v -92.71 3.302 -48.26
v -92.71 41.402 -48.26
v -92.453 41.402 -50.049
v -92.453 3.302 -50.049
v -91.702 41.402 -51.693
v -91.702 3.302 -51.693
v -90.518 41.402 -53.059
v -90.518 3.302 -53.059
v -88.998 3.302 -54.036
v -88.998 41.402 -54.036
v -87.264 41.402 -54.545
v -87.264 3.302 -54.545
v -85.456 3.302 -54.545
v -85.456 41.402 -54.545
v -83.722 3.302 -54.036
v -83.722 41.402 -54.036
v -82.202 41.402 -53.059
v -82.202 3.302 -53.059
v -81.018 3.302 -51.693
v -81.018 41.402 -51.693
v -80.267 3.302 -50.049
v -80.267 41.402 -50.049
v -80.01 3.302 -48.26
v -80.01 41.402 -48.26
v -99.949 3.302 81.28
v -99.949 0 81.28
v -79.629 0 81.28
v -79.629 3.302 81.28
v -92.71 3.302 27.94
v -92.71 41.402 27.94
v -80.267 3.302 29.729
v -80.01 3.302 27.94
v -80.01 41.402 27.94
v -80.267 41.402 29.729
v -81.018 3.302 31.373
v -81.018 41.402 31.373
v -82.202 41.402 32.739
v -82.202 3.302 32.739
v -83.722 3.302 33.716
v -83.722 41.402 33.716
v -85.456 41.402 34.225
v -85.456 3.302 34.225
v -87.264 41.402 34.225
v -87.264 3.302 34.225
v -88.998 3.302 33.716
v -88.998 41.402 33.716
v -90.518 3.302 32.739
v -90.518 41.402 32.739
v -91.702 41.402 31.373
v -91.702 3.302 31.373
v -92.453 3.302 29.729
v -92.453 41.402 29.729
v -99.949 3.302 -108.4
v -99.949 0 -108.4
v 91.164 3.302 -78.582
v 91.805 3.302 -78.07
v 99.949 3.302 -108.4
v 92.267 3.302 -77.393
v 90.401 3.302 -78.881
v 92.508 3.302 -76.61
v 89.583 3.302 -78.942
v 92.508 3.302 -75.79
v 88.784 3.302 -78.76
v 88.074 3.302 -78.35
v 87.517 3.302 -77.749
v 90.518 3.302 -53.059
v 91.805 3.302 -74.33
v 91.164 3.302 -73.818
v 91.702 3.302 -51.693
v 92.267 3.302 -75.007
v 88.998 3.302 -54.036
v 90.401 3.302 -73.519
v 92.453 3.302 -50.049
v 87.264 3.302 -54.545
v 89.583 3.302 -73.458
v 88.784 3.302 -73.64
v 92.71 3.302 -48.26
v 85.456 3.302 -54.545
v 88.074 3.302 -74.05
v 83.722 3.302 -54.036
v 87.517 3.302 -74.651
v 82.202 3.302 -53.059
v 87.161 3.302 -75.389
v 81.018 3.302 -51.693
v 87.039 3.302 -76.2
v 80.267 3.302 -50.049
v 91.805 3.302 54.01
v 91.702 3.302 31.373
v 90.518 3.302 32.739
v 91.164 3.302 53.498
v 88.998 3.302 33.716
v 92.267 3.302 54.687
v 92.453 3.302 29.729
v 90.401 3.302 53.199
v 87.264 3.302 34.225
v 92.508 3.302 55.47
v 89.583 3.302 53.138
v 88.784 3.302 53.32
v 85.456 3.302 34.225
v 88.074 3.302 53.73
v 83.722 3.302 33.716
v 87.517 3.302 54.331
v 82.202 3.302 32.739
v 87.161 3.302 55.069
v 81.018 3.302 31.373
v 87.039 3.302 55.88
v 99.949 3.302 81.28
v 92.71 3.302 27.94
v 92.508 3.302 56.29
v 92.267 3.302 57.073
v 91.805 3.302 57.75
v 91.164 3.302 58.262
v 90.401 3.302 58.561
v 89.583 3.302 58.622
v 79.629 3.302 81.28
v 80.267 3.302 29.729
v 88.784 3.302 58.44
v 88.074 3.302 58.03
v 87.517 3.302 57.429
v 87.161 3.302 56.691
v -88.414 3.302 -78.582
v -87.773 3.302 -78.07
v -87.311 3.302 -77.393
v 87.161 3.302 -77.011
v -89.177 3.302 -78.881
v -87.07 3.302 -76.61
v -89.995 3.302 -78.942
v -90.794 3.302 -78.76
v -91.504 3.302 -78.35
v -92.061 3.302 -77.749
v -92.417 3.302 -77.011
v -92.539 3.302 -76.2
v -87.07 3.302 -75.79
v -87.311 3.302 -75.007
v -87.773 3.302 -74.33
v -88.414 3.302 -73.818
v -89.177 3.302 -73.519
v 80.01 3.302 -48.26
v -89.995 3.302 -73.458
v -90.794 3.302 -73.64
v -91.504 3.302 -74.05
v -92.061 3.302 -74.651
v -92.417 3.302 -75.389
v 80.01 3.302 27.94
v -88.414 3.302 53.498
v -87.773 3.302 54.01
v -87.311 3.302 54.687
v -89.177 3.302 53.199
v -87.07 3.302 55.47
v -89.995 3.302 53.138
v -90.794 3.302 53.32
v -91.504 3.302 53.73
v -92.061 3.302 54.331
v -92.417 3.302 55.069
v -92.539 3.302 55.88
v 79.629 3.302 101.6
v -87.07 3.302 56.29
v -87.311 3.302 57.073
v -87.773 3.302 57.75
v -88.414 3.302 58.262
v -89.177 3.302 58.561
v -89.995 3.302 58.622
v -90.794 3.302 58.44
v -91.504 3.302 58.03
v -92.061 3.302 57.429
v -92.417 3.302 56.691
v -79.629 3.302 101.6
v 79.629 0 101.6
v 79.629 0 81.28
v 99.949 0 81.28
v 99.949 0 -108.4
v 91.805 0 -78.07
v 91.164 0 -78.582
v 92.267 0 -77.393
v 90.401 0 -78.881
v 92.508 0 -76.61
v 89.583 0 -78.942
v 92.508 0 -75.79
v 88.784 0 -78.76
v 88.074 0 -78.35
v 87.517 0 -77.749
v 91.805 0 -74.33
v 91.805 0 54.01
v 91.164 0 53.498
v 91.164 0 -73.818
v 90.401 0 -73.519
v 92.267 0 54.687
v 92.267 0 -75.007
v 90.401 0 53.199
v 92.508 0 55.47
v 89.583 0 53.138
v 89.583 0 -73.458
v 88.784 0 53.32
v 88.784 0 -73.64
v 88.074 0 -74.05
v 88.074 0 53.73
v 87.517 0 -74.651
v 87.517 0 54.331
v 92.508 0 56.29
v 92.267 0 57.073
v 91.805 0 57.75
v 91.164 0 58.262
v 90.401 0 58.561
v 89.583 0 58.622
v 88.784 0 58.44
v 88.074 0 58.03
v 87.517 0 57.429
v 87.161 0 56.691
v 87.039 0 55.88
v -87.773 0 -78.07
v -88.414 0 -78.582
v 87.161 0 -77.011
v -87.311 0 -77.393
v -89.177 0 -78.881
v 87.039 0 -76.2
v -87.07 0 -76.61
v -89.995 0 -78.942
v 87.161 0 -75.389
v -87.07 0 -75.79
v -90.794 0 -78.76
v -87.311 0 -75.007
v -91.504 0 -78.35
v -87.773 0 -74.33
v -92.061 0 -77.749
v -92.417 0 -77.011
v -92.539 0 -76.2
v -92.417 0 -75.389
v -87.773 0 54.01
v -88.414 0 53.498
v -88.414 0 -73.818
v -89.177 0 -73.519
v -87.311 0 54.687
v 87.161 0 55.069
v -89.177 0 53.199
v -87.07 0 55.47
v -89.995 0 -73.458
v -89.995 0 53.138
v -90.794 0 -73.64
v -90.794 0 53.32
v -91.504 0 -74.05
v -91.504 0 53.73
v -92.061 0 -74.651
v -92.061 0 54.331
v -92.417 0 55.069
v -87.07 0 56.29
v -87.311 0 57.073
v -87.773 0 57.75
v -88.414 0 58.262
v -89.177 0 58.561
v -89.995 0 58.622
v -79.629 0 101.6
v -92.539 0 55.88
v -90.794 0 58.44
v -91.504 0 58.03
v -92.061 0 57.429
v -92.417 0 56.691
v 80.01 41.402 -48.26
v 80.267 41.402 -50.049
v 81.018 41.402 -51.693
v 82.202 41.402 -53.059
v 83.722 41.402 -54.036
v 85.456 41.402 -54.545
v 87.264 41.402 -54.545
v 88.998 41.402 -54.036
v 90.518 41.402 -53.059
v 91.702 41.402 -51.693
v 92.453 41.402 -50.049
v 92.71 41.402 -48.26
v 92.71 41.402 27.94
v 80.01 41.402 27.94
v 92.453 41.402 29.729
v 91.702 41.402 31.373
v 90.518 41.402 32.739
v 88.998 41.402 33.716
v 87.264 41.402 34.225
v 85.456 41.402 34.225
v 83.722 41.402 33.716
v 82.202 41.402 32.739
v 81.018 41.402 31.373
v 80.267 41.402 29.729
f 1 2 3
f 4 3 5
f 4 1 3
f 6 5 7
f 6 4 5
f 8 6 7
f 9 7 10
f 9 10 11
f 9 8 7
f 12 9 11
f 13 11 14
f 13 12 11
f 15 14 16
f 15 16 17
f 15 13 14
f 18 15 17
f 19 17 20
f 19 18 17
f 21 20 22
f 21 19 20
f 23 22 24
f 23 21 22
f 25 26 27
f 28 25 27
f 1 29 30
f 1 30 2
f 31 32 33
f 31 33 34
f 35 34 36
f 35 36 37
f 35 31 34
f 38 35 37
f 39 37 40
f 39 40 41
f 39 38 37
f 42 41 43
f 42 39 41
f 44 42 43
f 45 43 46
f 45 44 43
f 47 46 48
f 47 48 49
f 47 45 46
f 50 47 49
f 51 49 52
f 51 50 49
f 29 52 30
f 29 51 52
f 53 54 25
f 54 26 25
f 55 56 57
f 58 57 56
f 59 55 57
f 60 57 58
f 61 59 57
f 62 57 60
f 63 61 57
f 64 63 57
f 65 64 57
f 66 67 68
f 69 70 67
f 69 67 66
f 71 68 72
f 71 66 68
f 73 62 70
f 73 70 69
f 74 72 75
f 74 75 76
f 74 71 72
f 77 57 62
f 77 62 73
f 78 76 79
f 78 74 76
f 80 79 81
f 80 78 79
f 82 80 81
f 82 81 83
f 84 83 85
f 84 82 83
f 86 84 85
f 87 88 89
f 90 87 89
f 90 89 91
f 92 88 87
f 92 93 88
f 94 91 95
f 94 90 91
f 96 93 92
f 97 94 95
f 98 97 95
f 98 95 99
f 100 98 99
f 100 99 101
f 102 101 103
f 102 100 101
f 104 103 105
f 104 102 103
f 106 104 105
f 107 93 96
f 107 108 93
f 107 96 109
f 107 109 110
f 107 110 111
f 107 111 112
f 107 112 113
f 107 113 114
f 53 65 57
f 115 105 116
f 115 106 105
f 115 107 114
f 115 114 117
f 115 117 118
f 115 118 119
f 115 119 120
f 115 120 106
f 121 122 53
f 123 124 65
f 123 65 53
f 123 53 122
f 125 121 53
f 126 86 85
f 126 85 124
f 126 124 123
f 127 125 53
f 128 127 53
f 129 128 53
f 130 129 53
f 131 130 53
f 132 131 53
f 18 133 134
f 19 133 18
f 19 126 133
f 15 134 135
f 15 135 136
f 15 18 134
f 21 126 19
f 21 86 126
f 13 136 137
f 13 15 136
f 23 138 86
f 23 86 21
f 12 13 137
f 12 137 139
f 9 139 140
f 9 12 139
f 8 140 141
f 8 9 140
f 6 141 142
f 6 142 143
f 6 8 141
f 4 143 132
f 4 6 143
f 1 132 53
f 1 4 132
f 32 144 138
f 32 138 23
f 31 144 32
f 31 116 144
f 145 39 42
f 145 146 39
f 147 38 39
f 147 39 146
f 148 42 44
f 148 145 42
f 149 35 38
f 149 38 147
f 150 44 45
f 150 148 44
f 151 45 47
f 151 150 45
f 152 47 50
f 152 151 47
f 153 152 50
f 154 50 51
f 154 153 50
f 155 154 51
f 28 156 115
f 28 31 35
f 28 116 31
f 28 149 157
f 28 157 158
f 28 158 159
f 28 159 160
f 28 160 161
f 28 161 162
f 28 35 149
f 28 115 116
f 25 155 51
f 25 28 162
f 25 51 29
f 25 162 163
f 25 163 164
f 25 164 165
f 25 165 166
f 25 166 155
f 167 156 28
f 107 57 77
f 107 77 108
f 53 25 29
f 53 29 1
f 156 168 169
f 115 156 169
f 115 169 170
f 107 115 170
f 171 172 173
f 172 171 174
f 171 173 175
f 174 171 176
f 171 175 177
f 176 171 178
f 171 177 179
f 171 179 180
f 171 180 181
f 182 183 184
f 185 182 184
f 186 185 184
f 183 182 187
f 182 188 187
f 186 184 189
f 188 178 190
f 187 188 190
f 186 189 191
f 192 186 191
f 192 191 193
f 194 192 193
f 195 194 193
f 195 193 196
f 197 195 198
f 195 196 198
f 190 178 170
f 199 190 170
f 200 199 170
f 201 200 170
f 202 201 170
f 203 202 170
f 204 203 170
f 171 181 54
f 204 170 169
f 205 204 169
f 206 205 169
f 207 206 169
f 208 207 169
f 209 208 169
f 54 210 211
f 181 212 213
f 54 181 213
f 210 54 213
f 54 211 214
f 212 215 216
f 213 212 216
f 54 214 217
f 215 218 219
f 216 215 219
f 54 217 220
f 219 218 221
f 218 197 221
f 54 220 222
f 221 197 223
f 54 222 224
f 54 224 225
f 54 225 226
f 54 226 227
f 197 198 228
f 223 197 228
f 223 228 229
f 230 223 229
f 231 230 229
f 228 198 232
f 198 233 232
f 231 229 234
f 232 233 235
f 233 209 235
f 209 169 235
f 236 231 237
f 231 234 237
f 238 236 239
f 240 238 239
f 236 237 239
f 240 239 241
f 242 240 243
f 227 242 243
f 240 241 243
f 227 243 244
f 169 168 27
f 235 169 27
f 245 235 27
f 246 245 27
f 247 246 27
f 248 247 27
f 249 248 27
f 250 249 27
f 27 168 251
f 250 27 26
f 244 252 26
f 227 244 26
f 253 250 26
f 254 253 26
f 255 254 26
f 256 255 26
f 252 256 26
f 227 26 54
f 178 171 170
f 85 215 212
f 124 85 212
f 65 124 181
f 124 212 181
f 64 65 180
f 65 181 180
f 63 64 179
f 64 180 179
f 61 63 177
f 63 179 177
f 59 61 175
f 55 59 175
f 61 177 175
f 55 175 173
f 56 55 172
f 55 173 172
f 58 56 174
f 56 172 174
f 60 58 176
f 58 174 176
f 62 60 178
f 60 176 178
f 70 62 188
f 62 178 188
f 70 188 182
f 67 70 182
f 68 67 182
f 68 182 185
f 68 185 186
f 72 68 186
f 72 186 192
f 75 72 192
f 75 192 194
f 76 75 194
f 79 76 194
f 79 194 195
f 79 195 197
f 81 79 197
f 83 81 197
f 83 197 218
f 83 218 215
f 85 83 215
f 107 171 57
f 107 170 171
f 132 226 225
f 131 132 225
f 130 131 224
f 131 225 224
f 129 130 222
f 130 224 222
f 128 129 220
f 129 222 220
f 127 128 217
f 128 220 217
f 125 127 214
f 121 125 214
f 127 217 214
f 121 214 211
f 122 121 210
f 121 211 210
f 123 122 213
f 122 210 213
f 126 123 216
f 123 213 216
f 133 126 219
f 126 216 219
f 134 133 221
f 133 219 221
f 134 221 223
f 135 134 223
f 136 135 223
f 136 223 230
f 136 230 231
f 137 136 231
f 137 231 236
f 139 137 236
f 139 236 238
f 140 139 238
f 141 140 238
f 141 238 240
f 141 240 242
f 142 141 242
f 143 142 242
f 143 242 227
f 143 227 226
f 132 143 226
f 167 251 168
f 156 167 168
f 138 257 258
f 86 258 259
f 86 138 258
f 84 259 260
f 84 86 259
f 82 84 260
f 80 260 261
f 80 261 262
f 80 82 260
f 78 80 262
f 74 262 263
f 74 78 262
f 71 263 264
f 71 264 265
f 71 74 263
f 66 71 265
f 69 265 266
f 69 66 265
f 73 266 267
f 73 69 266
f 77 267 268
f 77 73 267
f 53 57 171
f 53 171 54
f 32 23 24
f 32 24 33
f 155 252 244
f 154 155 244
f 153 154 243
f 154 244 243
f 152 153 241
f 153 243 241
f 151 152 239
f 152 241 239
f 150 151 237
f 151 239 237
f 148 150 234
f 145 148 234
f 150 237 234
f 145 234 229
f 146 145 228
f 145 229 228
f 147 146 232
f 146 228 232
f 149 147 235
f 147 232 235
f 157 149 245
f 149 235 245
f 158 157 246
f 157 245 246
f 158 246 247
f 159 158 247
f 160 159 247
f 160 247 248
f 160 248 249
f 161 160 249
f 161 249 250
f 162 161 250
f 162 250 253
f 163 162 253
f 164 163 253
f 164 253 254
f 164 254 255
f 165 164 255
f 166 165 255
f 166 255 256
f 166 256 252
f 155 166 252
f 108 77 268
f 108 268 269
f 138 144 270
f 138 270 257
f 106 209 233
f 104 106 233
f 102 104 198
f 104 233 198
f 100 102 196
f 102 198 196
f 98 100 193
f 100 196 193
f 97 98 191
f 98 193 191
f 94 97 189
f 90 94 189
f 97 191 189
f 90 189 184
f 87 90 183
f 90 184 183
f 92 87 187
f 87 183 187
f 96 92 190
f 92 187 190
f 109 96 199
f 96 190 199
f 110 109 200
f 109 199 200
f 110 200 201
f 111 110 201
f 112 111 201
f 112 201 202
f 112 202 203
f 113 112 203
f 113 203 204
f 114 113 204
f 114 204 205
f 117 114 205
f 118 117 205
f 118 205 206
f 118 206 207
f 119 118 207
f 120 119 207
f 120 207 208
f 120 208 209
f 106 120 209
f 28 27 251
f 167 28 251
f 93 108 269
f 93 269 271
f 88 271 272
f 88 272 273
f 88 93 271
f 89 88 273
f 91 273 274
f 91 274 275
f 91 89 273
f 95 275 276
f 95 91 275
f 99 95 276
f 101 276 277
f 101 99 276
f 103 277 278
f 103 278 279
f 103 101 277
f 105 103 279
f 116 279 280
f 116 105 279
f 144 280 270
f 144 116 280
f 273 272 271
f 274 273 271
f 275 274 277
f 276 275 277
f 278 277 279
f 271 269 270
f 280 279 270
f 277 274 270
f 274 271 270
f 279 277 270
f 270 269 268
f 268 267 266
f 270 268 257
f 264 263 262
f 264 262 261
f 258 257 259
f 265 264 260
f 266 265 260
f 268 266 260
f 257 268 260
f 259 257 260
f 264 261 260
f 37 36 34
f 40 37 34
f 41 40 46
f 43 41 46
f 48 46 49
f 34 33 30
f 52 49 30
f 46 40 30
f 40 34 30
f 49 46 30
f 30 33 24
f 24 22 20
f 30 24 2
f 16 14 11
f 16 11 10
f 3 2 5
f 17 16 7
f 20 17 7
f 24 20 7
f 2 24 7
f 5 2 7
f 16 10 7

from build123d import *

# Parameters (mm, degrees)
BOSS_EXTRUDE1_DEPTH  = 3.302
BOSS_EXTRUDE2_DEPTH  = 38.1
M5_CLEARANCE_HOLE1_D = 5.5
SKETCH6_W            = 199.898
SKETCH6_H            = 3.302
BOSS_EXTRUDE3_DEPTH  = 1.62
SKETCH7_W            = 199.898
SKETCH7_H            = 3.302
BOSS_EXTRUDE4_DEPTH  = 5.18


with BuildPart() as part:
    # Sketch1 → Boss-Extrude1 (new body)
    with BuildSketch(Plane(origin=(0, 0, 0), x_dir=(1, 0, 0), z_dir=(0, 1, 0))):
        Polygon((99.949, -81.28), (99.949, 101.6), (-99.949, 101.6), (-99.949, -81.28), (-79.629, -81.28), (-79.629, -101.6), (79.629, -101.6), (79.629, -81.28), align=None)
    extrude(amount=BOSS_EXTRUDE1_DEPTH)

    # Sketch3 → Boss-Extrude2 (add)
    with BuildSketch(Plane(origin=(0, 3.302, 0), x_dir=(1, 0, 0), z_dir=(0, 1, 0))):
        with BuildLine():
            Line((92.71, 48.26), (92.71, -27.94))
            ThreePointArc((92.71, -27.94), (86.36, -34.29), (80.01, -27.94))
            Line((80.01, -27.94), (80.01, 48.26))
            ThreePointArc((80.01, 48.26), (86.36, 54.61), (92.71, 48.26))
        make_face()
        with BuildLine():
            Line((-80.01, 48.26), (-80.01, -27.94))
            ThreePointArc((-80.01, -27.94), (-86.36, -34.29), (-92.71, -27.94))
            Line((-92.71, -27.94), (-92.71, 48.26))
            ThreePointArc((-92.71, 48.26), (-86.36, 54.61), (-80.01, 48.26))
        make_face()
    extrude(amount=BOSS_EXTRUDE2_DEPTH)

    # M5 Clearance Hole1 (through all)
    with Locations(Plane(origin=(0, 3.302, 0), x_dir=(1, 0, 0), z_dir=(0, 1, 0))):
        with Locations((-89.789, -55.88), (-89.789, 76.2), (89.789, -55.88), (89.789, 76.2)):
            Hole(M5_CLEARANCE_HOLE1_D / 2)

    # Sketch6 → Boss-Extrude3 (add)
    with BuildSketch(Plane(origin=(0, 0, -101.6), x_dir=(-1, 0, 0), z_dir=(0, 0, -1))):
        with Locations((0, 1.651)):
            Rectangle(SKETCH6_W, SKETCH6_H)
    extrude(amount=BOSS_EXTRUDE3_DEPTH)

    # Sketch7 → Boss-Extrude4 (add)
    with BuildSketch(Plane(origin=(0, 0, -103.22), x_dir=(-1, 0, 0), z_dir=(0, 0, -1))):
        with Locations((0, 1.651)):
            Rectangle(SKETCH7_W, SKETCH7_H)
    extrude(amount=BOSS_EXTRUDE4_DEPTH)


solid = part.part
